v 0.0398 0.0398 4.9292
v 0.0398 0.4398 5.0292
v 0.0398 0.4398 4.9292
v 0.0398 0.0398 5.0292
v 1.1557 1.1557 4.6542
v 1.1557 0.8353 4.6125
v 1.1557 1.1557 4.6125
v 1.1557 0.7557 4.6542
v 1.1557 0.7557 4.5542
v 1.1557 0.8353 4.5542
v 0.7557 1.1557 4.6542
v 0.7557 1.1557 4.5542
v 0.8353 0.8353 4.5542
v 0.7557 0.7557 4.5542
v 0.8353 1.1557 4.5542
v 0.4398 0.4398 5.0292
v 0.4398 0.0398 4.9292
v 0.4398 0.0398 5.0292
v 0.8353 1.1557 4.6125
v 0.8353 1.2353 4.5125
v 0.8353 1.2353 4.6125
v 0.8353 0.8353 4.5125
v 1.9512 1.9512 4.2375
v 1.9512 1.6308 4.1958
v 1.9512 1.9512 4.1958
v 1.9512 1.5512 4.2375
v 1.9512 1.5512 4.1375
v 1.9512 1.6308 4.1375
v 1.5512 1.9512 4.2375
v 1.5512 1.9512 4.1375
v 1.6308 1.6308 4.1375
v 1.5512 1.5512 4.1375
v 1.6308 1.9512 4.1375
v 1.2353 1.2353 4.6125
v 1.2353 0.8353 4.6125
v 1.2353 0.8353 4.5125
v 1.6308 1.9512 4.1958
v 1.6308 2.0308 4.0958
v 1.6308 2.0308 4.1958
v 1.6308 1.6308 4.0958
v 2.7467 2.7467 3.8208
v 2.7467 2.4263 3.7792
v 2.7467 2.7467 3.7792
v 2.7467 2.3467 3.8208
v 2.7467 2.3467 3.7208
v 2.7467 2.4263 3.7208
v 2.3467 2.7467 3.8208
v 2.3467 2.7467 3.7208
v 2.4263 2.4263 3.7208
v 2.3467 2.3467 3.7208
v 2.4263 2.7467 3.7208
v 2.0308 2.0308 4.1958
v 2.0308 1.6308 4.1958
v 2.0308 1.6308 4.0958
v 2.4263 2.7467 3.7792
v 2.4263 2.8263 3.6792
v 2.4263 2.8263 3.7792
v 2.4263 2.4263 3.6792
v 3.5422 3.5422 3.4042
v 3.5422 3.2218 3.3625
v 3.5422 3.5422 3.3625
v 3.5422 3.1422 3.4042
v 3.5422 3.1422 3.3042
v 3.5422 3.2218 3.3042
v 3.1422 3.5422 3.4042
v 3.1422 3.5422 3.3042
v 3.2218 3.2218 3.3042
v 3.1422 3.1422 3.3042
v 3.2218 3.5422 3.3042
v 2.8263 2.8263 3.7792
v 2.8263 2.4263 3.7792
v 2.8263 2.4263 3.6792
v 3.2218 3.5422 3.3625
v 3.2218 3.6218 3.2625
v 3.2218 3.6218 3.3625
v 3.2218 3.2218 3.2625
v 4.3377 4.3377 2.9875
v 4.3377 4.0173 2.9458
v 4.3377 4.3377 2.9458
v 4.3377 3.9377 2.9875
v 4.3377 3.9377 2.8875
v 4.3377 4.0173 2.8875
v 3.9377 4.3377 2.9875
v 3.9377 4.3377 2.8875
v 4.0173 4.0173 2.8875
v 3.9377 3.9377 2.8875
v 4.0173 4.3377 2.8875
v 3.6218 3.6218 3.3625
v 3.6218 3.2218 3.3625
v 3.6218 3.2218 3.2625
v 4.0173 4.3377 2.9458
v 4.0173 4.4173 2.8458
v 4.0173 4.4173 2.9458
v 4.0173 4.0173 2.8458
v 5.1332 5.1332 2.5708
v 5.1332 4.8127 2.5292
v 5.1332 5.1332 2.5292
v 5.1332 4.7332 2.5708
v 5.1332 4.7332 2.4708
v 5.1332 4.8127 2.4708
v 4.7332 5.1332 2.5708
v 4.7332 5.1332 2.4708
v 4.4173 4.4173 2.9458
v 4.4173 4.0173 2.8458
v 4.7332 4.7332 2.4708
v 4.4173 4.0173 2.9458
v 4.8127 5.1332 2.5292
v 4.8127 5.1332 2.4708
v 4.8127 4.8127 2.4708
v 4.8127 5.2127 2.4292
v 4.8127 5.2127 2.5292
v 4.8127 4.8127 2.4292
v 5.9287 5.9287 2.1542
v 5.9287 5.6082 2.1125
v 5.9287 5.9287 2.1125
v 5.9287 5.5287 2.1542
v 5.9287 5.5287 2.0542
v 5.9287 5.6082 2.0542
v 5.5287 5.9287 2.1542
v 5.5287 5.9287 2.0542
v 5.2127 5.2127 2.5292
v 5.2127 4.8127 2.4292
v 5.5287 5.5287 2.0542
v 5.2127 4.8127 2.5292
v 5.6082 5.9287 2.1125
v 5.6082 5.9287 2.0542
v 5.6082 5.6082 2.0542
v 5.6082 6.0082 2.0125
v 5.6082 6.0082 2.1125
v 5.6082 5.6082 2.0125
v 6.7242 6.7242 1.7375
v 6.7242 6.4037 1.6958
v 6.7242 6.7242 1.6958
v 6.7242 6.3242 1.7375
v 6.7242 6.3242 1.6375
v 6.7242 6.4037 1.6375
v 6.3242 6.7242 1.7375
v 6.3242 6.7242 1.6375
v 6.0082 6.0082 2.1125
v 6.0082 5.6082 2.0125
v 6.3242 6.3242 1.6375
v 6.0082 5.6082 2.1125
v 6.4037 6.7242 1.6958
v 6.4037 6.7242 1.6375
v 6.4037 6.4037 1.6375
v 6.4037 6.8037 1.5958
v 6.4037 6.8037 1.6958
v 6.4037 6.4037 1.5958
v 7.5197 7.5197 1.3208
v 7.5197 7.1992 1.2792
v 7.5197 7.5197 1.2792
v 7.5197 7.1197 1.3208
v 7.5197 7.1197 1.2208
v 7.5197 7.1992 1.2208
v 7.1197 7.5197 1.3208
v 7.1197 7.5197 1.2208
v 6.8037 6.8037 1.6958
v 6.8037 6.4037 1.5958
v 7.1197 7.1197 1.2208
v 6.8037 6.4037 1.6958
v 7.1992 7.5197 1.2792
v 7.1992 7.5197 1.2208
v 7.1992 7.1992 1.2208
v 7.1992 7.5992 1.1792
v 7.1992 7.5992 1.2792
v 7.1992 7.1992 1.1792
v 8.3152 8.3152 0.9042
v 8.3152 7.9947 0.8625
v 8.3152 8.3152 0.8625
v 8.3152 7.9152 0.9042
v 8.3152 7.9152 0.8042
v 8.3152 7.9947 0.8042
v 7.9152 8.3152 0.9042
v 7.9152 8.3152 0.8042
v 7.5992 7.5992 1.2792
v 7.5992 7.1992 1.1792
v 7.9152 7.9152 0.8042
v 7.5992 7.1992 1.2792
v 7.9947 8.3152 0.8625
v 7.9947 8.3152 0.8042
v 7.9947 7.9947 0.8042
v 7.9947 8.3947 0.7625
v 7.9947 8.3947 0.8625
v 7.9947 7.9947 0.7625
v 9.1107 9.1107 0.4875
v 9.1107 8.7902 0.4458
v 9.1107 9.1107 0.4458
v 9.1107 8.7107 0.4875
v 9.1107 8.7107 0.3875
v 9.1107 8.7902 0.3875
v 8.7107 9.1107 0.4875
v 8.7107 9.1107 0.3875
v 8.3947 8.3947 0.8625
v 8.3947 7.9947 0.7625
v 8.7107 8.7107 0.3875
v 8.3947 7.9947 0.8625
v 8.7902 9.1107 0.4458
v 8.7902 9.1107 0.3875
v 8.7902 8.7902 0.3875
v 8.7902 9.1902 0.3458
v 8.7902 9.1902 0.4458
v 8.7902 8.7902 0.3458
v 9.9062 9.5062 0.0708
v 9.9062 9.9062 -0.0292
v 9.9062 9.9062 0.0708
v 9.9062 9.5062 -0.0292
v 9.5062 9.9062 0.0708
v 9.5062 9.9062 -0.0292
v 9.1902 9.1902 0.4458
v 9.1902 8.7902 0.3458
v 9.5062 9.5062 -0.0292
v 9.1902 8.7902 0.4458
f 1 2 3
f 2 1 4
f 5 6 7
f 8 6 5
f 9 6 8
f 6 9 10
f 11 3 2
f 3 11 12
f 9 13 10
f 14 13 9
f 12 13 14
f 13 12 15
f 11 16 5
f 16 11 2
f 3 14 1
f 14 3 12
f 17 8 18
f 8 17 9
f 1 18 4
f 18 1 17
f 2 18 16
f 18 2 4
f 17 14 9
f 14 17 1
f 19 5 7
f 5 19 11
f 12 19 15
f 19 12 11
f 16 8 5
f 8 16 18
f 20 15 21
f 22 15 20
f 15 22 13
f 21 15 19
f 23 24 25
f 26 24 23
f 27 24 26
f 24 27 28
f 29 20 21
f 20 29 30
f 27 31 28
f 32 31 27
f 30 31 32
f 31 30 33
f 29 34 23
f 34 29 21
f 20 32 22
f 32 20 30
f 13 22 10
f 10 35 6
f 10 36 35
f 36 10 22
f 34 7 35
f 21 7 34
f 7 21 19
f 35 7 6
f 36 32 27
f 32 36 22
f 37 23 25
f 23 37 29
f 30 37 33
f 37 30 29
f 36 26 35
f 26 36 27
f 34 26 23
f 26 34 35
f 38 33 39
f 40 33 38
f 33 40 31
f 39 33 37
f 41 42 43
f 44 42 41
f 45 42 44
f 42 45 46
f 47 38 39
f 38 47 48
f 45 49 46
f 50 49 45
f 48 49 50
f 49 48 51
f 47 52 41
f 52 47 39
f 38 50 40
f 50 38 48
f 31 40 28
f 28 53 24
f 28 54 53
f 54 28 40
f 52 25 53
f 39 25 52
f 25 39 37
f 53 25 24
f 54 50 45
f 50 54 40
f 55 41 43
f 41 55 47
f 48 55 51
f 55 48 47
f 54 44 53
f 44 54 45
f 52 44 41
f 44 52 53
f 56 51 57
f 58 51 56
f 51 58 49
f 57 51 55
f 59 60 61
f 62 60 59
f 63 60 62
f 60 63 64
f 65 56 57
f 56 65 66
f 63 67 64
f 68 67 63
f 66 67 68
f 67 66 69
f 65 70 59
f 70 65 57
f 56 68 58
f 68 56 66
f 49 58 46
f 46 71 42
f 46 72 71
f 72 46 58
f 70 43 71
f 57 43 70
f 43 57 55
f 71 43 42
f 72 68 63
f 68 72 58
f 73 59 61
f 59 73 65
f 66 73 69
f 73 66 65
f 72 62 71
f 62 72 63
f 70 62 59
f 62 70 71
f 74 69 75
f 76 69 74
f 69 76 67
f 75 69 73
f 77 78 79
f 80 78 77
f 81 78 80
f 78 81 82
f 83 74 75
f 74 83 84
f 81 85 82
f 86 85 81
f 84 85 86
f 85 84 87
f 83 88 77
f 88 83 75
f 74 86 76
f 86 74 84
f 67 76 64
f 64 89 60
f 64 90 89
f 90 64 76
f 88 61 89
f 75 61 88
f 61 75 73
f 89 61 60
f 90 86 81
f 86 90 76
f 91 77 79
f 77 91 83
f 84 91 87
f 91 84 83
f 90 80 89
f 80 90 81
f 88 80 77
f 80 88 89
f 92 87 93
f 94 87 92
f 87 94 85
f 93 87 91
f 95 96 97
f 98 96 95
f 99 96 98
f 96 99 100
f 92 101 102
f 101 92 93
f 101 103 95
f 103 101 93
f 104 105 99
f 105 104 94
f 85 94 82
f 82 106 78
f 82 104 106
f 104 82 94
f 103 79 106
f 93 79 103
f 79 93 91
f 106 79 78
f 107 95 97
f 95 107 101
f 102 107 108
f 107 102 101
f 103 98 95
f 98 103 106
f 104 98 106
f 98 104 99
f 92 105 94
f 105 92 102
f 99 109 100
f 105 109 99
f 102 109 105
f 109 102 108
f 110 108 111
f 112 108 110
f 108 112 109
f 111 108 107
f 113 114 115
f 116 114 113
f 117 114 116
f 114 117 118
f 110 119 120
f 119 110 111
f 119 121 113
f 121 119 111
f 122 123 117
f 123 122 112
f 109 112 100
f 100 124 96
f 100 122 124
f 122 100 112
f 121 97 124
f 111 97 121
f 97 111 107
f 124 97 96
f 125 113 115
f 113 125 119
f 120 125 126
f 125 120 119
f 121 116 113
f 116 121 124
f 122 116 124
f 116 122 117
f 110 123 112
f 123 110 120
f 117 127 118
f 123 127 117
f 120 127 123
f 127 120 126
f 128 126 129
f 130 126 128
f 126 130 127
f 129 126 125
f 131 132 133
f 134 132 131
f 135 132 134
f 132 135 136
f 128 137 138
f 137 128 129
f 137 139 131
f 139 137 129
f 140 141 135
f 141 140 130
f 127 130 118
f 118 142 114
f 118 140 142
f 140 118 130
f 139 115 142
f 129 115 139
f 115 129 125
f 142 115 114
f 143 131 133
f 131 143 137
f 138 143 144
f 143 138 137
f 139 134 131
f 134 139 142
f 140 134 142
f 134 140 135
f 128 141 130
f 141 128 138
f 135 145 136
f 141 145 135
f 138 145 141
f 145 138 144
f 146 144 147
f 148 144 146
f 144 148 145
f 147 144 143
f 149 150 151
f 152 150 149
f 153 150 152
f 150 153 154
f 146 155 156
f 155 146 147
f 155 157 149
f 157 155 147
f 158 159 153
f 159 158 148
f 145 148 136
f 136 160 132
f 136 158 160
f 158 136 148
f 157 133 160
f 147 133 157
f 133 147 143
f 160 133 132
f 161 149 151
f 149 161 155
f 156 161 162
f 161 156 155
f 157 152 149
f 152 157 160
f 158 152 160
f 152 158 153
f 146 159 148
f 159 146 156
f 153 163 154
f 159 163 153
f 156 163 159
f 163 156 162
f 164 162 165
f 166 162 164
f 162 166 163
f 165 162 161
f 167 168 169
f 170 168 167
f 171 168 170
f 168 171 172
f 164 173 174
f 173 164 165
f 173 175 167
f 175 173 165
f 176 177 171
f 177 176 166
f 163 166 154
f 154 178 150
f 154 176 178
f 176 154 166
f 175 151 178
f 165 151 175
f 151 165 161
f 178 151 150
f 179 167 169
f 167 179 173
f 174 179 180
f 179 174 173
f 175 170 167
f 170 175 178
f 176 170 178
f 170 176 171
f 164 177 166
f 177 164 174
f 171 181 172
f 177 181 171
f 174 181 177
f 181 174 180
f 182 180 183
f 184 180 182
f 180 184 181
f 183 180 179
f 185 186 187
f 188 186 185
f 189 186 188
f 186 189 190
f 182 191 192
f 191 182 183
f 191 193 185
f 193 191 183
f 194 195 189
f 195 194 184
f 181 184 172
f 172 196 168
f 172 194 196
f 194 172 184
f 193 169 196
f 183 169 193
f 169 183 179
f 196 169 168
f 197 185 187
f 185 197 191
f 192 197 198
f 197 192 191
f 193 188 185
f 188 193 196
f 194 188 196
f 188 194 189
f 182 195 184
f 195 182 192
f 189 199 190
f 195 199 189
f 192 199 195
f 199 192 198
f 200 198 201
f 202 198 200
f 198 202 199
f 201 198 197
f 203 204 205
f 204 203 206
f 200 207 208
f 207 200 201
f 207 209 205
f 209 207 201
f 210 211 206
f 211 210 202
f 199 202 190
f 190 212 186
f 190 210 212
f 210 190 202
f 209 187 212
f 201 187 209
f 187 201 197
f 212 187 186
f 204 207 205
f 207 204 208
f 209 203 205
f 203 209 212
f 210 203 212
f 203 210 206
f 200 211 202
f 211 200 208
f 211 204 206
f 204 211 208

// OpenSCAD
hull() {
    translate([0.23977475000000004, 0.23977475000000004, 4.97916665]) cube([0.4, 0.4, 0.1], center=true);
    translate([0.95572025, 0.95572025, 4.60416635]) cube([0.4, 0.4, 0.1], center=true);
}


hull() {
    translate([1.03526975, 1.03526975, 4.5624997]) cube([0.4, 0.4, 0.1], center=true);
    translate([1.7512152500000002, 1.7512152500000002, 4.1875003]) cube([0.4, 0.4, 0.1], center=true);
}


hull() {
    translate([1.8307647500000002, 1.8307647500000002, 4.14583365]) cube([0.4, 0.4, 0.1], center=true);
    translate([2.5467102500000003, 2.5467102500000003, 3.77083335]) cube([0.4, 0.4, 0.1], center=true);
}


hull() {
    translate([2.6262598, 2.6262598, 3.72916665]) cube([0.4, 0.4, 0.1], center=true);
    translate([3.3422062, 3.3422062, 3.35416635]) cube([0.4, 0.4, 0.1], center=true);
}


hull() {
    translate([3.42175575, 3.42175575, 3.3124997]) cube([0.4, 0.4, 0.1], center=true);
    translate([4.137701250000001, 4.137701250000001, 2.9375003]) cube([0.4, 0.4, 0.1], center=true);
}


hull() {
    translate([4.217250750000001, 4.217250750000001, 2.89583365]) cube([0.4, 0.4, 0.1], center=true);
    translate([4.93319625, 4.93319625, 2.52083335]) cube([0.4, 0.4, 0.1], center=true);
}


hull() {
    translate([5.0127457500000006, 5.0127457500000006, 2.47916665]) cube([0.4, 0.4, 0.1], center=true);
    translate([5.728691250000001, 5.728691250000001, 2.10416635]) cube([0.4, 0.4, 0.1], center=true);
}


hull() {
    translate([5.80824075, 5.80824075, 2.0624997]) cube([0.4, 0.4, 0.1], center=true);
    translate([6.52418625, 6.52418625, 1.6875003]) cube([0.4, 0.4, 0.1], center=true);
}


hull() {
    translate([6.60373575, 6.60373575, 1.64583365]) cube([0.4, 0.4, 0.1], center=true);
    translate([7.31968125, 7.31968125, 1.27083335]) cube([0.4, 0.4, 0.1], center=true);
}


hull() {
    translate([7.39923075, 7.39923075, 1.22916665]) cube([0.4, 0.4, 0.1], center=true);
    translate([8.115176250000001, 8.115176250000001, 0.8541663500000001]) cube([0.4, 0.4, 0.1], center=true);
}


hull() {
    translate([8.19472575, 8.19472575, 0.8124997]) cube([0.4, 0.4, 0.1], center=true);
    translate([8.91067125, 8.91067125, 0.4375003]) cube([0.4, 0.4, 0.1], center=true);
}


hull() {
    translate([8.9902208, 8.9902208, 0.39583365000000004]) cube([0.4, 0.4, 0.1], center=true);
    translate([9.7061672, 9.7061672, 0.02083335]) cube([0.4, 0.4, 0.1], center=true);
}
